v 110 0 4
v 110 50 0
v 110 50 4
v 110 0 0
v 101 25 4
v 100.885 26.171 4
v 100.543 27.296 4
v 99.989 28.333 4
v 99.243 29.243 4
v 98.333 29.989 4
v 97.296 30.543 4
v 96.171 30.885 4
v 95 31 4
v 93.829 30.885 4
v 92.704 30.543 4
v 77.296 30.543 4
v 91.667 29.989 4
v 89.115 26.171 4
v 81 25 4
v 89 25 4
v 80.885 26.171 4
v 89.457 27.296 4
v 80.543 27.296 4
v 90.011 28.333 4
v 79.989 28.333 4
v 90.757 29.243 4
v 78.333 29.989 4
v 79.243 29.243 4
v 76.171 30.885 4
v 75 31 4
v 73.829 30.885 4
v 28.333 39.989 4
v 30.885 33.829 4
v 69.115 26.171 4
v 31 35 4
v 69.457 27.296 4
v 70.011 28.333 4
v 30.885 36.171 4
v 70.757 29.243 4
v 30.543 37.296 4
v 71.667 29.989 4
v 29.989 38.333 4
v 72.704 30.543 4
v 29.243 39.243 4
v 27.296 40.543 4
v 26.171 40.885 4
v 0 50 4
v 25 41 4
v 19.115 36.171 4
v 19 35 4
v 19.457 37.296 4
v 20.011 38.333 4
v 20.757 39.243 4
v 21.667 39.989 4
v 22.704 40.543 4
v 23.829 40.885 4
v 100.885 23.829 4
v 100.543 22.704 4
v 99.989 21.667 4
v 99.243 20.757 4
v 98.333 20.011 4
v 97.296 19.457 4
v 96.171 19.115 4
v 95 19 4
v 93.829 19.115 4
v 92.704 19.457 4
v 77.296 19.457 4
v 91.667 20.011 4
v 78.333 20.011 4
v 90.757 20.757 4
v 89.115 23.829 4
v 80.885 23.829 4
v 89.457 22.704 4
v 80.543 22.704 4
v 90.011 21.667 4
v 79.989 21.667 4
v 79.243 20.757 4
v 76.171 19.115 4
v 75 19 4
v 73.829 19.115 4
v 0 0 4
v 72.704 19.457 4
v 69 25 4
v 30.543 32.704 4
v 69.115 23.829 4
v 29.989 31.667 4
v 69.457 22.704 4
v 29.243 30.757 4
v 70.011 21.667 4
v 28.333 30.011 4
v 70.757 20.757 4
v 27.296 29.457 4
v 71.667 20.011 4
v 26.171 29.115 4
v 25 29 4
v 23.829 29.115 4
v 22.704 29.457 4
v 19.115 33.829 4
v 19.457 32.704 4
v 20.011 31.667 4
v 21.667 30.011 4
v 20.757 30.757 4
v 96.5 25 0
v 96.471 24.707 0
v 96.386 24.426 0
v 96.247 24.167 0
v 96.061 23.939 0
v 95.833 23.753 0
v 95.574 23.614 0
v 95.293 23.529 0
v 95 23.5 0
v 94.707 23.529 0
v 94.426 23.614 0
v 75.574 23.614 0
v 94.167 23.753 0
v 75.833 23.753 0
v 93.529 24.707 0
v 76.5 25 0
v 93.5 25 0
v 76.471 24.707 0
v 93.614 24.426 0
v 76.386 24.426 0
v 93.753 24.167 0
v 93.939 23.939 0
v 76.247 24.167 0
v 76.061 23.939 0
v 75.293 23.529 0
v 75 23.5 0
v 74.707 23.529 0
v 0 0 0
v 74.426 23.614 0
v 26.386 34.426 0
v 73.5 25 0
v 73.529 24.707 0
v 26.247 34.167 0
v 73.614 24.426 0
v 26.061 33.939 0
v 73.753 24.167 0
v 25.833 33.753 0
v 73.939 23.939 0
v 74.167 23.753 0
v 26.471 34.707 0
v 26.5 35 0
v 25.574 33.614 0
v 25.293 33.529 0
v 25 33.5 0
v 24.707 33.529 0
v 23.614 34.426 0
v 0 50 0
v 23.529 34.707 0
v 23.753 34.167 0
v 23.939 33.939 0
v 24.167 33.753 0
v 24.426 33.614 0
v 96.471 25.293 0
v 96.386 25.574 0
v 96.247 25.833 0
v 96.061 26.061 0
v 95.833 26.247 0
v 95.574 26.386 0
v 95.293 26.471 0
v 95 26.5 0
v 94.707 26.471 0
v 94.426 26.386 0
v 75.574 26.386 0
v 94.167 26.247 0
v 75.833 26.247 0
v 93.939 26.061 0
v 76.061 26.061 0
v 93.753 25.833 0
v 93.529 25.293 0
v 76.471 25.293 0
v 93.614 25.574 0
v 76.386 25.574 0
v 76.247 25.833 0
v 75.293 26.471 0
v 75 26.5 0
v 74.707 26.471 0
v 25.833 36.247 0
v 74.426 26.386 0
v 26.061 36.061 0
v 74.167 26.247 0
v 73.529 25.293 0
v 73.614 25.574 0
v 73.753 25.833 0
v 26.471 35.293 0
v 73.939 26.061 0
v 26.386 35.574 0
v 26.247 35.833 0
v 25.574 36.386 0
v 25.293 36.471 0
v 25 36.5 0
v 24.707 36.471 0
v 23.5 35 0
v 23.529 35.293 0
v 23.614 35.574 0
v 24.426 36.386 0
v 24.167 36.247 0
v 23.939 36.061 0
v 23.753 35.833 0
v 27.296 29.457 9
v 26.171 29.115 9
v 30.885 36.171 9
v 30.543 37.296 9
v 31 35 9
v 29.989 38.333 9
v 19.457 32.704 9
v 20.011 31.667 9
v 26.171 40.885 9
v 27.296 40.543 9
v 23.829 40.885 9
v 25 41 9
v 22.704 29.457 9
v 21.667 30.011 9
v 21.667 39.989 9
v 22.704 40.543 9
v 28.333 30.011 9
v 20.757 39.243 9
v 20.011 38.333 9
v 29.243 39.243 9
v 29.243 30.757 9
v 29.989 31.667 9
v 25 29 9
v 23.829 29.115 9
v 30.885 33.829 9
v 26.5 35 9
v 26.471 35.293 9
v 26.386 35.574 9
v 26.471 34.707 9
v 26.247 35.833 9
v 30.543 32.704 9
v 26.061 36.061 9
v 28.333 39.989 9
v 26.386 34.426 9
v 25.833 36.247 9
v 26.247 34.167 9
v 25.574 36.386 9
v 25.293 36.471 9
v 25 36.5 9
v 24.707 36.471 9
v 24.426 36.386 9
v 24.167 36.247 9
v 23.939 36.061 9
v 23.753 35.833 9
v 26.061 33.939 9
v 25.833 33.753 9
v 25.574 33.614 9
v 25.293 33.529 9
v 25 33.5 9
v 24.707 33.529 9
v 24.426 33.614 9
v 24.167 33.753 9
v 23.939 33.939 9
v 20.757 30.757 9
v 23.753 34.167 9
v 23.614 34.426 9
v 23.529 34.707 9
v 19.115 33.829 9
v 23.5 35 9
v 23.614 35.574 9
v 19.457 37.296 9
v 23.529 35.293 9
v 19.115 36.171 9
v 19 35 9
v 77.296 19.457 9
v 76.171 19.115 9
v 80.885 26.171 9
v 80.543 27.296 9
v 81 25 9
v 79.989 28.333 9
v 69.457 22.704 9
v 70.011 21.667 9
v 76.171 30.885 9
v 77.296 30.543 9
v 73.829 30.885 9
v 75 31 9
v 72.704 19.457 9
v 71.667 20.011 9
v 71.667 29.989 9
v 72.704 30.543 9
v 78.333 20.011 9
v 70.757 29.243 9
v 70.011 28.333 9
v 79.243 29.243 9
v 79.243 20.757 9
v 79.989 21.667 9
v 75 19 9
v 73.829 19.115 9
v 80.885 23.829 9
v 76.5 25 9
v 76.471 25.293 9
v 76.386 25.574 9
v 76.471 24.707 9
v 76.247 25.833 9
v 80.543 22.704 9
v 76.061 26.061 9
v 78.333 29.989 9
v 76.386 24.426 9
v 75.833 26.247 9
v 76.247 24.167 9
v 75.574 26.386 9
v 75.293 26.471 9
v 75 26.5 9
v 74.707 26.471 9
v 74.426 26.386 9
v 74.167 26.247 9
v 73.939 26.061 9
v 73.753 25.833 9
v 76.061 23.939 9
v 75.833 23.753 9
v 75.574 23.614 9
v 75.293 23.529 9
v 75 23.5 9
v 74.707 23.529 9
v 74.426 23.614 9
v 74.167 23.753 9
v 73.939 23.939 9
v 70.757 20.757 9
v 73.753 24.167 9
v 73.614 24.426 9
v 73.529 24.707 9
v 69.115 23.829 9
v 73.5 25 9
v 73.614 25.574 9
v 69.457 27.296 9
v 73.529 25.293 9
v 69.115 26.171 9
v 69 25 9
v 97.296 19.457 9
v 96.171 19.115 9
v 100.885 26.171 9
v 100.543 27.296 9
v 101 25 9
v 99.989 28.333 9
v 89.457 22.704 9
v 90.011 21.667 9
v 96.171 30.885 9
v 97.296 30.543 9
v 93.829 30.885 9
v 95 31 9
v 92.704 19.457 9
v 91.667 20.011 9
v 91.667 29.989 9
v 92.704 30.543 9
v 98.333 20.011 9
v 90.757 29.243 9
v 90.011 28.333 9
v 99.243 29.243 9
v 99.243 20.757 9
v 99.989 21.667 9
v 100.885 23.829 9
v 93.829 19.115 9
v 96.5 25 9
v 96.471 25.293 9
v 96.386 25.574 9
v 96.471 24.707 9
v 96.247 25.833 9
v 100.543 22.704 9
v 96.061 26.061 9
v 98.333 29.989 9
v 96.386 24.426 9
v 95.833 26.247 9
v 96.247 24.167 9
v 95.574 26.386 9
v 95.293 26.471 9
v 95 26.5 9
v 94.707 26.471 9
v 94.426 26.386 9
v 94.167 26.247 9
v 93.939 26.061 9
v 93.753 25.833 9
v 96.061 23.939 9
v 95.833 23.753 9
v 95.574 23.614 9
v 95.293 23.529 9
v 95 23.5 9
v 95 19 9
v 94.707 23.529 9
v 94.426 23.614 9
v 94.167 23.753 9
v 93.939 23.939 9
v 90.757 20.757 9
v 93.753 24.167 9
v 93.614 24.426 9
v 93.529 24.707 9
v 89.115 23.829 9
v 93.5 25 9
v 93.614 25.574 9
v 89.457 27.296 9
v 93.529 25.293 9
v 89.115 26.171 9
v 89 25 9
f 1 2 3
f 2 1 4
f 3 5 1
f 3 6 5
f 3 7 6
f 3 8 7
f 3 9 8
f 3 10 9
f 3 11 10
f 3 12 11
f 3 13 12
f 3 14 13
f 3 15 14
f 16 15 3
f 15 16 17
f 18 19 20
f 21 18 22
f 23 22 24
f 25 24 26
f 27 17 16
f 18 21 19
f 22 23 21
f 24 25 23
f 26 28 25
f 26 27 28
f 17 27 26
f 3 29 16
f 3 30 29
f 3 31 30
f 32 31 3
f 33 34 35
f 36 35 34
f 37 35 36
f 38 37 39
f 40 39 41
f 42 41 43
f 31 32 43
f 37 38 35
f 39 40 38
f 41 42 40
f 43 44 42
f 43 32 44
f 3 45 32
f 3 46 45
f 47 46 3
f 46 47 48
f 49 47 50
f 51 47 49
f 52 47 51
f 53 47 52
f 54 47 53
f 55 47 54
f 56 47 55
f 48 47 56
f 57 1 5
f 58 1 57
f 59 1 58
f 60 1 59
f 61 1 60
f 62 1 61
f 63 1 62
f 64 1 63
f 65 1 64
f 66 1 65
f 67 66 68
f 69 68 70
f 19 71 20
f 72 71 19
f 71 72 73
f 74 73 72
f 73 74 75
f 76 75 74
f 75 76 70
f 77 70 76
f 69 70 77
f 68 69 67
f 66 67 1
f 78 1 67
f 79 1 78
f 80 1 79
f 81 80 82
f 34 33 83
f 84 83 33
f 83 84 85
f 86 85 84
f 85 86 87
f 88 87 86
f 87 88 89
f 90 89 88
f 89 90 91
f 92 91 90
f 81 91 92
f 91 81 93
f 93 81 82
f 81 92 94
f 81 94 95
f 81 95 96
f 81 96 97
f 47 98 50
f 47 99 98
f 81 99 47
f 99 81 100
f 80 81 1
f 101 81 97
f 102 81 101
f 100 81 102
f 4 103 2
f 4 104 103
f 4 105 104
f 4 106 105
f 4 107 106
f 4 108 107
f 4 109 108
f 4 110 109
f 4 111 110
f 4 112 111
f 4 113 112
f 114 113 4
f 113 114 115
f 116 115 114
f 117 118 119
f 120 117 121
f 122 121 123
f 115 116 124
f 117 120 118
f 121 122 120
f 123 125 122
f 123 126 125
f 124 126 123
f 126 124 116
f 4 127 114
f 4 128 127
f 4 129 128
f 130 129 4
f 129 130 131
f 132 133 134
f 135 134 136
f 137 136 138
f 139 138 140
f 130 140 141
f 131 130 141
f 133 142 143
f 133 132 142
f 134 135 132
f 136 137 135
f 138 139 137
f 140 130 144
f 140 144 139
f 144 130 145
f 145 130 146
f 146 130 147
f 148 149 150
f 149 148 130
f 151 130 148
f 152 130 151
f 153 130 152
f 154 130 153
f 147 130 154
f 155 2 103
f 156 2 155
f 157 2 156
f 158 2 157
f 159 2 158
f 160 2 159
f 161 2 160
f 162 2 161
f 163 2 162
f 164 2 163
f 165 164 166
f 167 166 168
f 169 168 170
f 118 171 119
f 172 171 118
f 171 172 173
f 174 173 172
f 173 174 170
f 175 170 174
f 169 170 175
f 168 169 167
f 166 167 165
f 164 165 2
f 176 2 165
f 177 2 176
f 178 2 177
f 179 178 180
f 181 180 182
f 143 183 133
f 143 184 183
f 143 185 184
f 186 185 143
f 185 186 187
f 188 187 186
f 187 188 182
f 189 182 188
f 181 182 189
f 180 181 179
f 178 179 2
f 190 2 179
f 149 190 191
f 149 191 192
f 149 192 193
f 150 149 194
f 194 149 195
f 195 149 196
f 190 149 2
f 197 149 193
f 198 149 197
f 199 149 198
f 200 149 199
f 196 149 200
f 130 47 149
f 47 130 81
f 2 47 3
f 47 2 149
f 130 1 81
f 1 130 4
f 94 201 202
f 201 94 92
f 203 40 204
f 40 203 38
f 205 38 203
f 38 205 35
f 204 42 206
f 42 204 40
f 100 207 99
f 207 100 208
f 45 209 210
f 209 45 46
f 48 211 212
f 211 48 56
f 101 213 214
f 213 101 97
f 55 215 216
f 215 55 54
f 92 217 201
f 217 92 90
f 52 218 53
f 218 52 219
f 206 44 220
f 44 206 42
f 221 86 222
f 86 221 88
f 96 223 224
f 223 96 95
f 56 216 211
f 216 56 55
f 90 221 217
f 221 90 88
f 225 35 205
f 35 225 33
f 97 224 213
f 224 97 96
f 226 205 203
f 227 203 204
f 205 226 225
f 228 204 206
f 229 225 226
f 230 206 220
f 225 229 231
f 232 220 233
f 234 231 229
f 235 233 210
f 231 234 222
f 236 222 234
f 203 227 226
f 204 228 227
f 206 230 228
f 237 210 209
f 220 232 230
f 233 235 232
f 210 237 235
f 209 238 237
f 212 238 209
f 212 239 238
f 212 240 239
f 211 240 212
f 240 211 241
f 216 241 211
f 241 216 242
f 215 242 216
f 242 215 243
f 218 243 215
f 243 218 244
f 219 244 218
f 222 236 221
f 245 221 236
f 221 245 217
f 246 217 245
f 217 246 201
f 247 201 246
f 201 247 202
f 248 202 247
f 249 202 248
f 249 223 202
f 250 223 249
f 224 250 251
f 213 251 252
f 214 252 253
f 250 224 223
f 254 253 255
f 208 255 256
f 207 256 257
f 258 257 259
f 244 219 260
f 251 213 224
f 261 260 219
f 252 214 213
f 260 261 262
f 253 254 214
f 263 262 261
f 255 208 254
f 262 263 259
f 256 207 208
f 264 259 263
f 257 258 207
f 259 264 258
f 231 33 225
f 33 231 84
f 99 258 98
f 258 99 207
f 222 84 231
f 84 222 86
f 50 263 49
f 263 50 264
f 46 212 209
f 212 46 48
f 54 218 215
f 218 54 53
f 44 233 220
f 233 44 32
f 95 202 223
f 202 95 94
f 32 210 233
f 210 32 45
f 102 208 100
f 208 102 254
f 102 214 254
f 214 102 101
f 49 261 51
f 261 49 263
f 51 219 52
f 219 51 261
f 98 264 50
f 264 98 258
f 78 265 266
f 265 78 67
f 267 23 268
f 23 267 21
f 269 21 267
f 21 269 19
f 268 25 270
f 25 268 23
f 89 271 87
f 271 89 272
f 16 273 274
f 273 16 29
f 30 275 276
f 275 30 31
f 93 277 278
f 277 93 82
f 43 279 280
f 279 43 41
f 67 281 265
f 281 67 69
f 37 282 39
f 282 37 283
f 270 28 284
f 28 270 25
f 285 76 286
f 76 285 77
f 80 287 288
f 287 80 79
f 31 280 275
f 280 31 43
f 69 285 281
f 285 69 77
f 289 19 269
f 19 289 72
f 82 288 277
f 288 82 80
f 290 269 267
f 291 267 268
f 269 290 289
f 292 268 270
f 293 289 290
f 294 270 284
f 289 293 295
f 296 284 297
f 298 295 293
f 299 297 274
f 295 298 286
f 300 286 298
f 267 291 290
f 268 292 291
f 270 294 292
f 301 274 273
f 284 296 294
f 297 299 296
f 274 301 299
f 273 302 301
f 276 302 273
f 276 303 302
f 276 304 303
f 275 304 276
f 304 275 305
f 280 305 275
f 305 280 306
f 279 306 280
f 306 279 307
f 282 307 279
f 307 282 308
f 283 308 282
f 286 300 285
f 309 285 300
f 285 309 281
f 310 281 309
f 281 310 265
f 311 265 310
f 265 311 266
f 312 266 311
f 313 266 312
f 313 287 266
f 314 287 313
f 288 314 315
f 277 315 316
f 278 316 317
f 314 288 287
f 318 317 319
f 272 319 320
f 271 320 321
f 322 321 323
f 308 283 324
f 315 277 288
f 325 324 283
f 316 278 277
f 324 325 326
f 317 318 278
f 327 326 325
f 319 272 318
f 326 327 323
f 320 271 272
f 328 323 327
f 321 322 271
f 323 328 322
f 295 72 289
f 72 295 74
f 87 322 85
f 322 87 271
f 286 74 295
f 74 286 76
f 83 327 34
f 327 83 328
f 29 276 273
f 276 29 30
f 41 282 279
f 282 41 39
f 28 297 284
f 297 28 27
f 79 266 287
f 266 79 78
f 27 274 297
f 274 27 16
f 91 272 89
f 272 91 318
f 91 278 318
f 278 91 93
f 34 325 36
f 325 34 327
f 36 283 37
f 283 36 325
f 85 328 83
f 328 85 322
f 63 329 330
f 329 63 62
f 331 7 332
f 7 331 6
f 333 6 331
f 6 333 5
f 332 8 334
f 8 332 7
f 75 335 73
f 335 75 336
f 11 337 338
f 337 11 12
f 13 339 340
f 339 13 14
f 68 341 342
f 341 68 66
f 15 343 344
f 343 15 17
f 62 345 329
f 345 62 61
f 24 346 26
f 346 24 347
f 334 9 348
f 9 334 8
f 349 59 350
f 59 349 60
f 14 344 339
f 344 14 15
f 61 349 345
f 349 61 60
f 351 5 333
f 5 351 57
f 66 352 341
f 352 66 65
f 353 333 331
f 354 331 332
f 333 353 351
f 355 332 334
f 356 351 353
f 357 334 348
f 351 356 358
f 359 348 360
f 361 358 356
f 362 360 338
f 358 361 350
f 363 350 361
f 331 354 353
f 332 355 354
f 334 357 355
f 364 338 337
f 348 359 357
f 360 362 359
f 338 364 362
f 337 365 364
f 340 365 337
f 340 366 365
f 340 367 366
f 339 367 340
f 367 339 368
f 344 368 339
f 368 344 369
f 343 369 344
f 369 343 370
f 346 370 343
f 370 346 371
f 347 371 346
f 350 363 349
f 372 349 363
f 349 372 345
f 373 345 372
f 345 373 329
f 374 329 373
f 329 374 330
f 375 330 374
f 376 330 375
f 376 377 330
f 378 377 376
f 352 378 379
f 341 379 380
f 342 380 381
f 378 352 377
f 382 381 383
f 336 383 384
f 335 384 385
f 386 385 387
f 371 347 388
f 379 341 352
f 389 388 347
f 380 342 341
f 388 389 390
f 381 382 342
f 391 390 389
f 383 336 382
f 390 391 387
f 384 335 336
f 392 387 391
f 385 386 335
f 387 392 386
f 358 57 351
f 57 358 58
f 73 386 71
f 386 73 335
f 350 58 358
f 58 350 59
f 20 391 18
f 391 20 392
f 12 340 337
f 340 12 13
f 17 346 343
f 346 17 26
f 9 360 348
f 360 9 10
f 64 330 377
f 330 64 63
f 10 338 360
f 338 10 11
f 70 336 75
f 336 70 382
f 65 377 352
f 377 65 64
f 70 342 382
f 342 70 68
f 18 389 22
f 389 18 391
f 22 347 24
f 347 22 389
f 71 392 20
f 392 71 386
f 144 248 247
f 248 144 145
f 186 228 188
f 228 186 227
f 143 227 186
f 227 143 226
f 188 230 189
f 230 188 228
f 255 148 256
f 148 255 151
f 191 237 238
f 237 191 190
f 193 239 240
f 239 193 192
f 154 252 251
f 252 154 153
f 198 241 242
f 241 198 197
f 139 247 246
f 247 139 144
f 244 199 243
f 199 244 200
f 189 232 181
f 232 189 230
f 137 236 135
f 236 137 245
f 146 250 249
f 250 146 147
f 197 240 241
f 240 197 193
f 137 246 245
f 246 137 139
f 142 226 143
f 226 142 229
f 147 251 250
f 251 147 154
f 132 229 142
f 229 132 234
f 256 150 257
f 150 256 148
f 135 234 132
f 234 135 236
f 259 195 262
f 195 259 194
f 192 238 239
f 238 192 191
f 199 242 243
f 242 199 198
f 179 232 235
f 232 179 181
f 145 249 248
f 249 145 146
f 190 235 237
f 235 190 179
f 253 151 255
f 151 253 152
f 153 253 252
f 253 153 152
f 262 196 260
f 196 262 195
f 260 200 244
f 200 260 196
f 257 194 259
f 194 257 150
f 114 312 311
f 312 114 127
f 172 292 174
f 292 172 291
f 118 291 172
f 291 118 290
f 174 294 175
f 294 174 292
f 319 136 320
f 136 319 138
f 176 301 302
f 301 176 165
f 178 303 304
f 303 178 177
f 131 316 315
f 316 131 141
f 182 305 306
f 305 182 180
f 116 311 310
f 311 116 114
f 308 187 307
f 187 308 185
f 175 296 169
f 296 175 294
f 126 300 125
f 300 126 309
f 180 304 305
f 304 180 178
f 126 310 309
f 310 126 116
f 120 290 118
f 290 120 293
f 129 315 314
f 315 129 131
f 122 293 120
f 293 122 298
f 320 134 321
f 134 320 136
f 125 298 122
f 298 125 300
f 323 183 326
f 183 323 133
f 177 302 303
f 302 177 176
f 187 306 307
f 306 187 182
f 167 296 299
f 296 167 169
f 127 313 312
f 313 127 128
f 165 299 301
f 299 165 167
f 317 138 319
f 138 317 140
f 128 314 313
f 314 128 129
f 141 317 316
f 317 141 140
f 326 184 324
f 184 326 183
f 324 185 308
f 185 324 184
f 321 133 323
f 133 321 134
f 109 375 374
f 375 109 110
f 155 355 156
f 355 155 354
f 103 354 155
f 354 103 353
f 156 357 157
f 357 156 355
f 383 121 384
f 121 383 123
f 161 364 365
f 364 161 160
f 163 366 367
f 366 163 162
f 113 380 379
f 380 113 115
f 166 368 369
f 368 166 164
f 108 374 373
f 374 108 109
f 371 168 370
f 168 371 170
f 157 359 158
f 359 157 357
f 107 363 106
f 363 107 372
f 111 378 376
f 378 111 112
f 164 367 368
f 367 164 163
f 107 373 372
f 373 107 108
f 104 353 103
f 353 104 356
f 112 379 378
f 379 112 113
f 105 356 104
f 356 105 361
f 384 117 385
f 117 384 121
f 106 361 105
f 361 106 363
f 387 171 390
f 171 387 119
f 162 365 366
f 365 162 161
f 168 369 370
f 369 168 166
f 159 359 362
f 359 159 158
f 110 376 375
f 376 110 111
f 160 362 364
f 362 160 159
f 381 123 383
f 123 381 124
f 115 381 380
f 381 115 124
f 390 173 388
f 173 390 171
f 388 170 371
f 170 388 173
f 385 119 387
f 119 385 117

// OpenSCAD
$fn = 32;

// ----------------------------------------------------------------------
// Boss field: plate with bosses at given coordinates
// ----------------------------------------------------------------------

// --- parameters (mm) ---
plate_l = 110;            // plate length, X
plate_w = 50;             // plate width, Y
plate_t = 4;              // plate thickness, Z
boss_d = 12;              // boss diameter
boss_h = 5;               // boss height above the plate
bore_d = 3;               // boss bore

total_h = plate_t + boss_h;  // overall height

difference() {
  union() {
    cube([plate_l, plate_w, plate_t]);
    translate([25, 35, plate_t]) cylinder(h = boss_h, d = boss_d);
    translate([75, 25, plate_t]) cylinder(h = boss_h, d = boss_d);
    translate([95, 25, plate_t]) cylinder(h = boss_h, d = boss_d);
  }
  translate([25, 35, -1]) cylinder(h = total_h + 2, d = bore_d);
  translate([75, 25, -1]) cylinder(h = total_h + 2, d = bore_d);
  translate([95, 25, -1]) cylinder(h = total_h + 2, d = bore_d);
}
